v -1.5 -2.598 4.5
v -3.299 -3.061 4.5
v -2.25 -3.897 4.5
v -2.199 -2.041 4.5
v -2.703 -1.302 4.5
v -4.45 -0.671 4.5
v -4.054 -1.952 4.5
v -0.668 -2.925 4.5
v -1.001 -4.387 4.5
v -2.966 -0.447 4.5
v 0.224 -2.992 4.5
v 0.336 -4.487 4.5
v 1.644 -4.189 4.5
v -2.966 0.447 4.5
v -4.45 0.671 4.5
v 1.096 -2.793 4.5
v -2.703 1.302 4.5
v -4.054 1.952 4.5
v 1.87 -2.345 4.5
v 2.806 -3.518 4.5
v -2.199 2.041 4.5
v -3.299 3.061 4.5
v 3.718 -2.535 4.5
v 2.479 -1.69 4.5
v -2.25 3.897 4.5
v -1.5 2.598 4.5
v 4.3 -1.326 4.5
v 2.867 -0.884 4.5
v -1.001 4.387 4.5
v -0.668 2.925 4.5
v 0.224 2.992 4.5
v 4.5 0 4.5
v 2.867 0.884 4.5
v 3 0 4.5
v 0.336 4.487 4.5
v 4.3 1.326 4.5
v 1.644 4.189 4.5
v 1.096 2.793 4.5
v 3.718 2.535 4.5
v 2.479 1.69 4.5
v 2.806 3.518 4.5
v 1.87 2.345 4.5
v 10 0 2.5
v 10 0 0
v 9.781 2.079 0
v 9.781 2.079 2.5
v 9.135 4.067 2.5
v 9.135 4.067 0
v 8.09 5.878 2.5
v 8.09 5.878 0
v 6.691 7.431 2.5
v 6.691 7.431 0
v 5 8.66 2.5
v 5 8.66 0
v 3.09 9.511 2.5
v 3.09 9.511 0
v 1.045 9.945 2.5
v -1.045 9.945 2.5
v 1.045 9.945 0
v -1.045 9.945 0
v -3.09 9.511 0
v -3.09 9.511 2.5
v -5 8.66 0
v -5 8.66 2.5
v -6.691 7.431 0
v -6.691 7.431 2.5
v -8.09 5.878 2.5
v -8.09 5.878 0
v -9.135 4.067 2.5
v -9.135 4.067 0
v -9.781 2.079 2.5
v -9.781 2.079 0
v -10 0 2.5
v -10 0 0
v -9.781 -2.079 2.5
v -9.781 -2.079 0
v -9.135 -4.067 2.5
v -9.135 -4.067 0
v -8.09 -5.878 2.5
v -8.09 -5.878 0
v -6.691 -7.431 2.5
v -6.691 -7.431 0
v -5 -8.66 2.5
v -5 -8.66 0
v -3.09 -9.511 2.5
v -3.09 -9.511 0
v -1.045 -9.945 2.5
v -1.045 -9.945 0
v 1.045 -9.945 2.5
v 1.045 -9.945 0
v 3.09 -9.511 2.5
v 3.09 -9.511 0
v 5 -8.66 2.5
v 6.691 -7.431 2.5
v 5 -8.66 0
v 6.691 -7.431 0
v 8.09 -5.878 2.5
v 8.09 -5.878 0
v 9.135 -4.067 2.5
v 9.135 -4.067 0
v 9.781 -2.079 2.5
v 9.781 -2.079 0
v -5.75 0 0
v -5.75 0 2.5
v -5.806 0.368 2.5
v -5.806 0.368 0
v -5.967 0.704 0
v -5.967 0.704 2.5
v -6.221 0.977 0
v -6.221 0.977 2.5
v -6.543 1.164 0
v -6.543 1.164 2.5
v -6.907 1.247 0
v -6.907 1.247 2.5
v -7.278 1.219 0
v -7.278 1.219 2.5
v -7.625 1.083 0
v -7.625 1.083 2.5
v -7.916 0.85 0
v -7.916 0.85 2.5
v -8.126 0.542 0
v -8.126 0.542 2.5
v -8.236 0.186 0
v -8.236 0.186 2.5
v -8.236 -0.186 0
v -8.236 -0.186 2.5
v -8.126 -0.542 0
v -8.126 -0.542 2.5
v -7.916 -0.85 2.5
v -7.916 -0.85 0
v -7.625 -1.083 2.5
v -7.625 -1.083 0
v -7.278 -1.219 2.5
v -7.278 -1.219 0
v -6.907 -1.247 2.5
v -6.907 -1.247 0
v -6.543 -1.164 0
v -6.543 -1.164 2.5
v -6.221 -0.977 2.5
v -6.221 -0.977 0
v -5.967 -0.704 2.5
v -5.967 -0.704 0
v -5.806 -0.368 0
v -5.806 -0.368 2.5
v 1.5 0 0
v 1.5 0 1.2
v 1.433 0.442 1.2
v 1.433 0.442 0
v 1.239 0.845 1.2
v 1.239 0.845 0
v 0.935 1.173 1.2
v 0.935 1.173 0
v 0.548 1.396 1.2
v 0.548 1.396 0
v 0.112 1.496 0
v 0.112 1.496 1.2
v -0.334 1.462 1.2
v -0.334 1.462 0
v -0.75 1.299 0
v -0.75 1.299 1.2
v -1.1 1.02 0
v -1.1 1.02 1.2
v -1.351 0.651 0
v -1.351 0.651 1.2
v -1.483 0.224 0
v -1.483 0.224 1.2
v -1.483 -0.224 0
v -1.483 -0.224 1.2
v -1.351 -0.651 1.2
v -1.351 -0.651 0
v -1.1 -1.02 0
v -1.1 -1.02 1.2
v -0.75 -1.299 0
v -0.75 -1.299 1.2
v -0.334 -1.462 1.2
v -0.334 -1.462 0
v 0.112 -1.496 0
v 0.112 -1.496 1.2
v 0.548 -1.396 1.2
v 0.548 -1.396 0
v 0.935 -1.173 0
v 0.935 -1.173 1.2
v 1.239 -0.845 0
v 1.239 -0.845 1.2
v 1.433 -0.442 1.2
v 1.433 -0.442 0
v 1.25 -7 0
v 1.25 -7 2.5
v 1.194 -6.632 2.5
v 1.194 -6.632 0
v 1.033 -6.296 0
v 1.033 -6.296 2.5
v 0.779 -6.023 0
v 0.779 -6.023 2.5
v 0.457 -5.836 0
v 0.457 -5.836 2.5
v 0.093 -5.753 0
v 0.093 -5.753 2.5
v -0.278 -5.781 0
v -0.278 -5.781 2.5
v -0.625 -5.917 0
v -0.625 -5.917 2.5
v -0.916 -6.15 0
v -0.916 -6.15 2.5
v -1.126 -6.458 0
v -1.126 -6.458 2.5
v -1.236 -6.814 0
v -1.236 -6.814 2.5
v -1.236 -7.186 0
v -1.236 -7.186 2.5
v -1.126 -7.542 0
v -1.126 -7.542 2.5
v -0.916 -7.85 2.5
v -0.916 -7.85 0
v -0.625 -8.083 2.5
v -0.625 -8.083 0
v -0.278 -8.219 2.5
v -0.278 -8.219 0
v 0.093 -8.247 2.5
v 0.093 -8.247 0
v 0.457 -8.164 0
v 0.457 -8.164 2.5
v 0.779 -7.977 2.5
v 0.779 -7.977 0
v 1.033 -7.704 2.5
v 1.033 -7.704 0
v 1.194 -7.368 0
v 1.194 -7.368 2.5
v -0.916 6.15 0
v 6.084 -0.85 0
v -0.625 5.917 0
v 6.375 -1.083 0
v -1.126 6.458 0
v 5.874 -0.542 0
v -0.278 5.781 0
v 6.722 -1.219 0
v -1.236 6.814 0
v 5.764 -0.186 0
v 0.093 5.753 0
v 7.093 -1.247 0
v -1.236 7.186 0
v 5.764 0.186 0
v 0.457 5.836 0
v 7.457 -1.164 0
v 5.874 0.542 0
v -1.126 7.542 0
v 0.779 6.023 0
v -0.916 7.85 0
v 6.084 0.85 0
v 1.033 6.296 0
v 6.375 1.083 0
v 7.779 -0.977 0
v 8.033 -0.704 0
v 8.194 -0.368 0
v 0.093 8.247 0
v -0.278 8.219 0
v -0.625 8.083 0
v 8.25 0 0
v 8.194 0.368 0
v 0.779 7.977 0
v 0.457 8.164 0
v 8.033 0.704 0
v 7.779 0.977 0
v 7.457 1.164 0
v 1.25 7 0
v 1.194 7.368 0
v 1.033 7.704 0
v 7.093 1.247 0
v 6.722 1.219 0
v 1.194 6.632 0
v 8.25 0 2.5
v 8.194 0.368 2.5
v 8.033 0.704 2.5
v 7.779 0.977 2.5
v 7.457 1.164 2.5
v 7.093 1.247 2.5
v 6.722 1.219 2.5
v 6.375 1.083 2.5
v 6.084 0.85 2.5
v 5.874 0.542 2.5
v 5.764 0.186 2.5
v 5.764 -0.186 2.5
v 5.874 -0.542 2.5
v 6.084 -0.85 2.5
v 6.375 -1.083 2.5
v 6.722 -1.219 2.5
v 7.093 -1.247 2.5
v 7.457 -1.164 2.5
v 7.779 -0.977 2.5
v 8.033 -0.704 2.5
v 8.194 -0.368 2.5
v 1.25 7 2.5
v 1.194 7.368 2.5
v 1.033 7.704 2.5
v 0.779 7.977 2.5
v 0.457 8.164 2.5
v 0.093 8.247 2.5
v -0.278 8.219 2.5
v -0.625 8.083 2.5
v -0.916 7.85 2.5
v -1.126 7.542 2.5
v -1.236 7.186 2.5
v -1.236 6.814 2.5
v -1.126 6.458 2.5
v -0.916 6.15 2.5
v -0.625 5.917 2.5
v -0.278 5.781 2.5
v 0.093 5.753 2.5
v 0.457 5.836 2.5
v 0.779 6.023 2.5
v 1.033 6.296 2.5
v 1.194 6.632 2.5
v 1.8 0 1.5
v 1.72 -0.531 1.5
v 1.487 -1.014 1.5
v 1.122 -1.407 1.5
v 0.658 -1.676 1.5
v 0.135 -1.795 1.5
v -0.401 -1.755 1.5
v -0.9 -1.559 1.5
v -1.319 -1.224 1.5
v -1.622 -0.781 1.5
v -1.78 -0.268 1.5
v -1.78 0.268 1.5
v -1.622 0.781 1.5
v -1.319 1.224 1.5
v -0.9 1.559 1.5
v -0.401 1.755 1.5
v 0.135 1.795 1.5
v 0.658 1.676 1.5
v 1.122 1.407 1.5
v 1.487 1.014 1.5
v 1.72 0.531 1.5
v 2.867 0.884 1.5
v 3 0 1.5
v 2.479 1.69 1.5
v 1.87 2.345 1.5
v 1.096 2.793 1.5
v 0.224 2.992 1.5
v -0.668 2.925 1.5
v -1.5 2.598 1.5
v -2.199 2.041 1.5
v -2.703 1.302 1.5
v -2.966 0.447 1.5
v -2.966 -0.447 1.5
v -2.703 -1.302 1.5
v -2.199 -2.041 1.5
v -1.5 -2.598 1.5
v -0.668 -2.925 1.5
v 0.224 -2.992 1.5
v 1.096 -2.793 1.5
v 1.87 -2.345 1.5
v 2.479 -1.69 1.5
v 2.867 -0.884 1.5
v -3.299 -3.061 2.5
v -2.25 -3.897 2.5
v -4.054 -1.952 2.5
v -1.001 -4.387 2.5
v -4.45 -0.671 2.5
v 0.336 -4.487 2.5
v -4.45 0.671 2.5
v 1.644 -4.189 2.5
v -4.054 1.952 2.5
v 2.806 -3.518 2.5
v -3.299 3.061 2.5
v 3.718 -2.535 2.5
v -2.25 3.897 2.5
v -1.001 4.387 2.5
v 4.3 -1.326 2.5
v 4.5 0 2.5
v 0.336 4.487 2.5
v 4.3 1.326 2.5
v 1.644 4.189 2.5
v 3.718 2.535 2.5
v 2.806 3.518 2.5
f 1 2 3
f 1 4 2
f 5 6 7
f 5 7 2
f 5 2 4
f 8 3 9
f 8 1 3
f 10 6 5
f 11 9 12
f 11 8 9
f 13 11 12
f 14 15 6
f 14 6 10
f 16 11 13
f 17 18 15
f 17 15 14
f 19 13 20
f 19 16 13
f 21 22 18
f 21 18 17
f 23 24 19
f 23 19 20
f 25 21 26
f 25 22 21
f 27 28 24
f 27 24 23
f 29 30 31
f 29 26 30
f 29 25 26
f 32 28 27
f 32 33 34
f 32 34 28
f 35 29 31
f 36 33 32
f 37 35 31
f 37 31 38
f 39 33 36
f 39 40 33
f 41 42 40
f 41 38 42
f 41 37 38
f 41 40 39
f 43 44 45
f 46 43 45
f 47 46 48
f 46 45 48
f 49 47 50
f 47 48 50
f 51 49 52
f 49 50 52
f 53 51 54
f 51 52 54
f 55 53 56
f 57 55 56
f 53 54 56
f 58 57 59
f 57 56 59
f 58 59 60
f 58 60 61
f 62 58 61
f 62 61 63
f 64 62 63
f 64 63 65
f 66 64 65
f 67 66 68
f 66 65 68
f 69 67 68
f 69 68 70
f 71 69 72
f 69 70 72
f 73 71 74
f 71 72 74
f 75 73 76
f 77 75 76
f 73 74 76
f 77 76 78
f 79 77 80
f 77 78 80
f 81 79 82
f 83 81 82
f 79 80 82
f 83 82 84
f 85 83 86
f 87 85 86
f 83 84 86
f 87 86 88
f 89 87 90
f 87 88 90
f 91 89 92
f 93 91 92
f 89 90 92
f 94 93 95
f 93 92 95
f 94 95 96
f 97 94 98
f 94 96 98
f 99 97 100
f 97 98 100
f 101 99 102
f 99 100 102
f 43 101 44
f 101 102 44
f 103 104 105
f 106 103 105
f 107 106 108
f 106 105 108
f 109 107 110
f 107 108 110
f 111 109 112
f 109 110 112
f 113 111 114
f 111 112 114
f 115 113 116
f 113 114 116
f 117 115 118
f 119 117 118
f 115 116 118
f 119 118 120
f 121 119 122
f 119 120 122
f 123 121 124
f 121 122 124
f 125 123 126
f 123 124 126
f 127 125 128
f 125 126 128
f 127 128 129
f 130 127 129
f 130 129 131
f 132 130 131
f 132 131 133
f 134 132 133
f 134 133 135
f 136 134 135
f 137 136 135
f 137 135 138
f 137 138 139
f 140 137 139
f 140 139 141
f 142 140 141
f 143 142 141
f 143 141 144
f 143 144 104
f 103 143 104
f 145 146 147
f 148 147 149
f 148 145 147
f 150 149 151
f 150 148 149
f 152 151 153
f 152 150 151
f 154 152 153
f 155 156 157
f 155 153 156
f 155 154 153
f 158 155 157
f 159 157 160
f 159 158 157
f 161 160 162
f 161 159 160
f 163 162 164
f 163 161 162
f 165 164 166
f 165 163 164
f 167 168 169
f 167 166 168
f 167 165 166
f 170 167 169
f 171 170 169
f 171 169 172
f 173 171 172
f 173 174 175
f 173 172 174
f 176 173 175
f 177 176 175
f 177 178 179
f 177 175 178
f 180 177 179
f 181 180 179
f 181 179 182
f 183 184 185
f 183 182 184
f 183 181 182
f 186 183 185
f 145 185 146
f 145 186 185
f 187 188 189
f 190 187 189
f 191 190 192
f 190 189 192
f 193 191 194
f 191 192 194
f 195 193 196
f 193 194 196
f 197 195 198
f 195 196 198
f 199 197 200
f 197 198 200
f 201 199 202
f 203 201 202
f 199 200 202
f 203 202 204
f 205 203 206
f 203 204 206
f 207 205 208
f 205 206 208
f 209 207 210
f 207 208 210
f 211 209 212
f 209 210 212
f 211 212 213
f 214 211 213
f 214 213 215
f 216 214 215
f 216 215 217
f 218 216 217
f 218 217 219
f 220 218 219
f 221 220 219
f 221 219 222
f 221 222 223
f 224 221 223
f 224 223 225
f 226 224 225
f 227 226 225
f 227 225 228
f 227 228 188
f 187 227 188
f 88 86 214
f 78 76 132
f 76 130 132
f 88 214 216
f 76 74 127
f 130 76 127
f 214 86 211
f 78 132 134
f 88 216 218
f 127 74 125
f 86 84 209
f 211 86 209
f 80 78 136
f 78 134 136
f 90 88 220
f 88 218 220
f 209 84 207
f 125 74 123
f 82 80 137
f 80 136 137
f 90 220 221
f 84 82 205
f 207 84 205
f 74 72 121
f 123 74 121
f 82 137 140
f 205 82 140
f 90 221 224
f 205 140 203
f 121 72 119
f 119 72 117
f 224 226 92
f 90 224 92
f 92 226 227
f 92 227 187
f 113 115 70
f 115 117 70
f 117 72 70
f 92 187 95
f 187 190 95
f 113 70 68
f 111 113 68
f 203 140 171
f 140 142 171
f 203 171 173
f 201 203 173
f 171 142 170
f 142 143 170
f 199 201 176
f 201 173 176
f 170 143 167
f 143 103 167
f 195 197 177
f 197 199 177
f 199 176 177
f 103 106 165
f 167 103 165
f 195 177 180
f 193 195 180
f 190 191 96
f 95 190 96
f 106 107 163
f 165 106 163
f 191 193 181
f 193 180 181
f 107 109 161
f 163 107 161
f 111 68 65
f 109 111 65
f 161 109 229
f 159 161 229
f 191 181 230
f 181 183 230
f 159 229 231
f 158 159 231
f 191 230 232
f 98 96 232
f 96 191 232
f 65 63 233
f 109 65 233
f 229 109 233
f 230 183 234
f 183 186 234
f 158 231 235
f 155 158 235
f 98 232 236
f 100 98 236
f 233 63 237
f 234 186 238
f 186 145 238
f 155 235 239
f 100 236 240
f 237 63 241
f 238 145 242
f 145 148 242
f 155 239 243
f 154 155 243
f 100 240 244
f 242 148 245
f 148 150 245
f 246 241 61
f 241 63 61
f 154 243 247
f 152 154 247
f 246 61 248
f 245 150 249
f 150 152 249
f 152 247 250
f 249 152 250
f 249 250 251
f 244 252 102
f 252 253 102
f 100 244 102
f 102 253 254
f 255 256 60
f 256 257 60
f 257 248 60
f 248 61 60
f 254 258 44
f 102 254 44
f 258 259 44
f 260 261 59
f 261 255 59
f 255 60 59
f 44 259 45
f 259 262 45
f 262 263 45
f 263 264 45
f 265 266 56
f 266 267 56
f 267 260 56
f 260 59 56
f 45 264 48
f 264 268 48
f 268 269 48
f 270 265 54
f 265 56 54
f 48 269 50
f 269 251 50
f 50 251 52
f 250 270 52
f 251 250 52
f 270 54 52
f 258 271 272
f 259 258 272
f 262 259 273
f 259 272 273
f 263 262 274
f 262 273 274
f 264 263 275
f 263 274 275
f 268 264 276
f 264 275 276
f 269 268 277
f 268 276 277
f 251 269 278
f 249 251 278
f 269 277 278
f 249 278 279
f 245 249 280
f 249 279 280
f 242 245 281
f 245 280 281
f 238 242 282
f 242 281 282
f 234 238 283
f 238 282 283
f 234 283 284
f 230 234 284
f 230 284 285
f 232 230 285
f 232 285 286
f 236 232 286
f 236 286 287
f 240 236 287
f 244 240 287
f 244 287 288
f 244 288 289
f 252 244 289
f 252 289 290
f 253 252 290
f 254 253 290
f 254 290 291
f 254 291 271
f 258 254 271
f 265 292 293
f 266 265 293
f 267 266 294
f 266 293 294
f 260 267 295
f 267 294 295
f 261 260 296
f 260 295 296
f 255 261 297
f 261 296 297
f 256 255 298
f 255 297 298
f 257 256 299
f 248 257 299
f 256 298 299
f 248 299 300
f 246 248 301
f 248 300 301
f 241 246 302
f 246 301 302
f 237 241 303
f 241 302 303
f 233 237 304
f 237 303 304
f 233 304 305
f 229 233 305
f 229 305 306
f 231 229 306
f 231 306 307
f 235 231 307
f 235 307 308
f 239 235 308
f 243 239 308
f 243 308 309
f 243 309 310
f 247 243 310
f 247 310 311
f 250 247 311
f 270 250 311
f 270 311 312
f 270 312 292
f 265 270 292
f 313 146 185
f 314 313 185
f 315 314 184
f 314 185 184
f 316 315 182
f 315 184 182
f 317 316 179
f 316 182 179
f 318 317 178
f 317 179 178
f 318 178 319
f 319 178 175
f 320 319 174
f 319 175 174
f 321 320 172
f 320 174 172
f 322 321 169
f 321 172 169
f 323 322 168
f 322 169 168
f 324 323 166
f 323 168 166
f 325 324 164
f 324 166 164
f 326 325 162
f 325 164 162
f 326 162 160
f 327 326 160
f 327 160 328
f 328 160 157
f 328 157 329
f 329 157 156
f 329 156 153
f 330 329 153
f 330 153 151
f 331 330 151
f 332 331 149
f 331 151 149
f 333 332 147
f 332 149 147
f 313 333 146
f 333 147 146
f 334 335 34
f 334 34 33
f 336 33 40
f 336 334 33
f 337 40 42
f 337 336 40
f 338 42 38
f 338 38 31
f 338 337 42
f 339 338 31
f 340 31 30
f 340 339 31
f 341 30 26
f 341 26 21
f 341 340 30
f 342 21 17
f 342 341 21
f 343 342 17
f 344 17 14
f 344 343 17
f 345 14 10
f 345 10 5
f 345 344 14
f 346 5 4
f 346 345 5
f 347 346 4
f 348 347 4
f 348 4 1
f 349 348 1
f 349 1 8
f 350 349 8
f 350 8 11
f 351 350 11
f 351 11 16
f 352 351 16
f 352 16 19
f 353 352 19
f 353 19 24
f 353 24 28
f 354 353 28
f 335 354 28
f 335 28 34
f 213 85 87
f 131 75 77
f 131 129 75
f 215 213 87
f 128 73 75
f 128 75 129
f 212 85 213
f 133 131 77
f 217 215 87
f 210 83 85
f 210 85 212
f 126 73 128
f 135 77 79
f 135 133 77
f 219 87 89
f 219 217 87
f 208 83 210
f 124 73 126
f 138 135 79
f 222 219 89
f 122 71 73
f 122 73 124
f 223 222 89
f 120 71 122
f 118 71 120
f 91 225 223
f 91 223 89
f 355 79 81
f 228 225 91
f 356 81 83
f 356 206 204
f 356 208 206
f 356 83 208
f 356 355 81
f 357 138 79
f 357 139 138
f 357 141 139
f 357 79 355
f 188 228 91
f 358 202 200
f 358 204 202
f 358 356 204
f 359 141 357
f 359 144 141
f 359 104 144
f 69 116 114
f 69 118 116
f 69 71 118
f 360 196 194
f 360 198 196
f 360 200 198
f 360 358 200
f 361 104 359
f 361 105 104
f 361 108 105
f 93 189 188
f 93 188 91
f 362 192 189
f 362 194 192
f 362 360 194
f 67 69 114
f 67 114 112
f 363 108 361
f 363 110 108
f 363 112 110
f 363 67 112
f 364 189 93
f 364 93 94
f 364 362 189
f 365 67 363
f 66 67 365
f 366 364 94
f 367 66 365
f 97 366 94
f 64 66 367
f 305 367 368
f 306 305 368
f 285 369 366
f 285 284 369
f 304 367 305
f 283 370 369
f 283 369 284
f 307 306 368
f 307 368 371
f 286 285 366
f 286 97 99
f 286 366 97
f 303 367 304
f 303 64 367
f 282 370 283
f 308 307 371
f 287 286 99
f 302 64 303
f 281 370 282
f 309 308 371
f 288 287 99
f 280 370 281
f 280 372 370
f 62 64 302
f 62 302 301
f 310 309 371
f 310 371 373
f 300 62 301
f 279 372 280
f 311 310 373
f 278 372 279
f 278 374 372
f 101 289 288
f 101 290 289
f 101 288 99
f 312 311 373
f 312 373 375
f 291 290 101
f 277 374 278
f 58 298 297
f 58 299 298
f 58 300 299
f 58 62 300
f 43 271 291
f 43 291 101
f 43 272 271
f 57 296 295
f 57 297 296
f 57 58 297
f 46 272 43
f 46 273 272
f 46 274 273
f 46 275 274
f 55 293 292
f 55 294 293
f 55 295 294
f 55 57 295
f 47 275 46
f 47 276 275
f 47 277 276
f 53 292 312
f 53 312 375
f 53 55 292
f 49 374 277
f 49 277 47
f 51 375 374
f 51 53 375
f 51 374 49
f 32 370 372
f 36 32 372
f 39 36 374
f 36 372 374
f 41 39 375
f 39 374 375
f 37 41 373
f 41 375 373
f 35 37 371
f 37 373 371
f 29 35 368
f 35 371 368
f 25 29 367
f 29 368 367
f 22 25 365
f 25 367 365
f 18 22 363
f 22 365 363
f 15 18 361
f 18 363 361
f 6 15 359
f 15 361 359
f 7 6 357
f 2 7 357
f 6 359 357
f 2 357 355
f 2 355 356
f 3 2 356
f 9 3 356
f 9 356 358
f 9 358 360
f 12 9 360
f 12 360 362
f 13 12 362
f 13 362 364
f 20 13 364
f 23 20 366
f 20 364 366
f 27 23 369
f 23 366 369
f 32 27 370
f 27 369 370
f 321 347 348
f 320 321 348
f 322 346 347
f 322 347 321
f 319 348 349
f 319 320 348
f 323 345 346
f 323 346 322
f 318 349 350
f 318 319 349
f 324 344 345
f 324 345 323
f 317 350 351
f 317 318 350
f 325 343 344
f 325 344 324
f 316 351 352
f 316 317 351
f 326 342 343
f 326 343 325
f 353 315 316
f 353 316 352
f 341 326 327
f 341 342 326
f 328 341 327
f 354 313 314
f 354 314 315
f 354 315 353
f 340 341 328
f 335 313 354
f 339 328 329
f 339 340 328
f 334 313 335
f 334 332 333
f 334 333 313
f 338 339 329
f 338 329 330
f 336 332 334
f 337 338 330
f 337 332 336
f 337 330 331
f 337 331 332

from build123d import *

# Parameters (mm, degrees)
SKETCH_1_R             = 10
SKETCH_1_R_2           = 0.5
SKETCH_1_R_3           = 1.5
EXTRUDE_1_DEPTH        = 2.5
SKETCH_2_R             = 4.5
SKETCH_2_R_2           = 3
EXTRUDE_2_DEPTH        = 2
CUT_EXTRUDE_START      = -1
SKETCH_3_R             = 3
CUT_EXTRUDE_1_DEPTH    = 1
CHAMFER_1_SIZE         = 0.3
HOLE_WIZARD_M3_1_D     = 2.5
HOLE_WIZARD_M3_1_DEPTH = 6.5
HOLE_WIZARD_M3_1_TIP   = 0.751075774


with BuildPart() as part:
    # 草图1 → 凸台-拉伸1 (new body)
    with BuildSketch(Plane.XY):
        Circle(SKETCH_1_R)
        with Locations((0, 7)):
            Circle(SKETCH_1_R_2, mode=Mode.SUBTRACT)
        with Locations((7, 0)):
            Circle(SKETCH_1_R_2, mode=Mode.SUBTRACT)
        with Locations((0, -7)):
            Circle(SKETCH_1_R_2, mode=Mode.SUBTRACT)
        with Locations((-7, 0)):
            Circle(SKETCH_1_R_2, mode=Mode.SUBTRACT)
        Circle(SKETCH_1_R_3, mode=Mode.SUBTRACT)
    extrude(amount=EXTRUDE_1_DEPTH)

    # 草图2 → 凸台-拉伸2 (add)
    with BuildSketch(Plane.XY.offset(2.5)):
        Circle(SKETCH_2_R)
        Circle(SKETCH_2_R_2, mode=Mode.SUBTRACT)
    extrude(amount=EXTRUDE_2_DEPTH)

    # 草图3 → 切除-拉伸1 (cut)
    with BuildSketch(Plane.XY.offset(2.5).offset(CUT_EXTRUDE_START)):
        Circle(SKETCH_3_R)
    extrude(amount=CUT_EXTRUDE_1_DEPTH, mode=Mode.SUBTRACT)

    # 倒角1
    chamfer_1_edges = [part.edges().sort_by_distance(p)[0] for p in [
        (-1.5, 0, 1.5),
    ]]
    chamfer(chamfer_1_edges, length=CHAMFER_1_SIZE)

    # M3 螺纹孔的螺纹孔钻头1
    with Locations(Plane(origin=(0, 0, 0), x_dir=(-1, 0, 0), z_dir=(0, 0, -1))):
        with Locations((0, 7), (7, 0), (0, -7), (-7, 0)):
            Hole(HOLE_WIZARD_M3_1_D / 2, depth=HOLE_WIZARD_M3_1_DEPTH)
            with Locations((0, 0, -(HOLE_WIZARD_M3_1_DEPTH + HOLE_WIZARD_M3_1_TIP / 2))):  # 118° drill point
                Cone(0, HOLE_WIZARD_M3_1_D / 2, HOLE_WIZARD_M3_1_TIP, mode=Mode.SUBTRACT)


solid = part.part
